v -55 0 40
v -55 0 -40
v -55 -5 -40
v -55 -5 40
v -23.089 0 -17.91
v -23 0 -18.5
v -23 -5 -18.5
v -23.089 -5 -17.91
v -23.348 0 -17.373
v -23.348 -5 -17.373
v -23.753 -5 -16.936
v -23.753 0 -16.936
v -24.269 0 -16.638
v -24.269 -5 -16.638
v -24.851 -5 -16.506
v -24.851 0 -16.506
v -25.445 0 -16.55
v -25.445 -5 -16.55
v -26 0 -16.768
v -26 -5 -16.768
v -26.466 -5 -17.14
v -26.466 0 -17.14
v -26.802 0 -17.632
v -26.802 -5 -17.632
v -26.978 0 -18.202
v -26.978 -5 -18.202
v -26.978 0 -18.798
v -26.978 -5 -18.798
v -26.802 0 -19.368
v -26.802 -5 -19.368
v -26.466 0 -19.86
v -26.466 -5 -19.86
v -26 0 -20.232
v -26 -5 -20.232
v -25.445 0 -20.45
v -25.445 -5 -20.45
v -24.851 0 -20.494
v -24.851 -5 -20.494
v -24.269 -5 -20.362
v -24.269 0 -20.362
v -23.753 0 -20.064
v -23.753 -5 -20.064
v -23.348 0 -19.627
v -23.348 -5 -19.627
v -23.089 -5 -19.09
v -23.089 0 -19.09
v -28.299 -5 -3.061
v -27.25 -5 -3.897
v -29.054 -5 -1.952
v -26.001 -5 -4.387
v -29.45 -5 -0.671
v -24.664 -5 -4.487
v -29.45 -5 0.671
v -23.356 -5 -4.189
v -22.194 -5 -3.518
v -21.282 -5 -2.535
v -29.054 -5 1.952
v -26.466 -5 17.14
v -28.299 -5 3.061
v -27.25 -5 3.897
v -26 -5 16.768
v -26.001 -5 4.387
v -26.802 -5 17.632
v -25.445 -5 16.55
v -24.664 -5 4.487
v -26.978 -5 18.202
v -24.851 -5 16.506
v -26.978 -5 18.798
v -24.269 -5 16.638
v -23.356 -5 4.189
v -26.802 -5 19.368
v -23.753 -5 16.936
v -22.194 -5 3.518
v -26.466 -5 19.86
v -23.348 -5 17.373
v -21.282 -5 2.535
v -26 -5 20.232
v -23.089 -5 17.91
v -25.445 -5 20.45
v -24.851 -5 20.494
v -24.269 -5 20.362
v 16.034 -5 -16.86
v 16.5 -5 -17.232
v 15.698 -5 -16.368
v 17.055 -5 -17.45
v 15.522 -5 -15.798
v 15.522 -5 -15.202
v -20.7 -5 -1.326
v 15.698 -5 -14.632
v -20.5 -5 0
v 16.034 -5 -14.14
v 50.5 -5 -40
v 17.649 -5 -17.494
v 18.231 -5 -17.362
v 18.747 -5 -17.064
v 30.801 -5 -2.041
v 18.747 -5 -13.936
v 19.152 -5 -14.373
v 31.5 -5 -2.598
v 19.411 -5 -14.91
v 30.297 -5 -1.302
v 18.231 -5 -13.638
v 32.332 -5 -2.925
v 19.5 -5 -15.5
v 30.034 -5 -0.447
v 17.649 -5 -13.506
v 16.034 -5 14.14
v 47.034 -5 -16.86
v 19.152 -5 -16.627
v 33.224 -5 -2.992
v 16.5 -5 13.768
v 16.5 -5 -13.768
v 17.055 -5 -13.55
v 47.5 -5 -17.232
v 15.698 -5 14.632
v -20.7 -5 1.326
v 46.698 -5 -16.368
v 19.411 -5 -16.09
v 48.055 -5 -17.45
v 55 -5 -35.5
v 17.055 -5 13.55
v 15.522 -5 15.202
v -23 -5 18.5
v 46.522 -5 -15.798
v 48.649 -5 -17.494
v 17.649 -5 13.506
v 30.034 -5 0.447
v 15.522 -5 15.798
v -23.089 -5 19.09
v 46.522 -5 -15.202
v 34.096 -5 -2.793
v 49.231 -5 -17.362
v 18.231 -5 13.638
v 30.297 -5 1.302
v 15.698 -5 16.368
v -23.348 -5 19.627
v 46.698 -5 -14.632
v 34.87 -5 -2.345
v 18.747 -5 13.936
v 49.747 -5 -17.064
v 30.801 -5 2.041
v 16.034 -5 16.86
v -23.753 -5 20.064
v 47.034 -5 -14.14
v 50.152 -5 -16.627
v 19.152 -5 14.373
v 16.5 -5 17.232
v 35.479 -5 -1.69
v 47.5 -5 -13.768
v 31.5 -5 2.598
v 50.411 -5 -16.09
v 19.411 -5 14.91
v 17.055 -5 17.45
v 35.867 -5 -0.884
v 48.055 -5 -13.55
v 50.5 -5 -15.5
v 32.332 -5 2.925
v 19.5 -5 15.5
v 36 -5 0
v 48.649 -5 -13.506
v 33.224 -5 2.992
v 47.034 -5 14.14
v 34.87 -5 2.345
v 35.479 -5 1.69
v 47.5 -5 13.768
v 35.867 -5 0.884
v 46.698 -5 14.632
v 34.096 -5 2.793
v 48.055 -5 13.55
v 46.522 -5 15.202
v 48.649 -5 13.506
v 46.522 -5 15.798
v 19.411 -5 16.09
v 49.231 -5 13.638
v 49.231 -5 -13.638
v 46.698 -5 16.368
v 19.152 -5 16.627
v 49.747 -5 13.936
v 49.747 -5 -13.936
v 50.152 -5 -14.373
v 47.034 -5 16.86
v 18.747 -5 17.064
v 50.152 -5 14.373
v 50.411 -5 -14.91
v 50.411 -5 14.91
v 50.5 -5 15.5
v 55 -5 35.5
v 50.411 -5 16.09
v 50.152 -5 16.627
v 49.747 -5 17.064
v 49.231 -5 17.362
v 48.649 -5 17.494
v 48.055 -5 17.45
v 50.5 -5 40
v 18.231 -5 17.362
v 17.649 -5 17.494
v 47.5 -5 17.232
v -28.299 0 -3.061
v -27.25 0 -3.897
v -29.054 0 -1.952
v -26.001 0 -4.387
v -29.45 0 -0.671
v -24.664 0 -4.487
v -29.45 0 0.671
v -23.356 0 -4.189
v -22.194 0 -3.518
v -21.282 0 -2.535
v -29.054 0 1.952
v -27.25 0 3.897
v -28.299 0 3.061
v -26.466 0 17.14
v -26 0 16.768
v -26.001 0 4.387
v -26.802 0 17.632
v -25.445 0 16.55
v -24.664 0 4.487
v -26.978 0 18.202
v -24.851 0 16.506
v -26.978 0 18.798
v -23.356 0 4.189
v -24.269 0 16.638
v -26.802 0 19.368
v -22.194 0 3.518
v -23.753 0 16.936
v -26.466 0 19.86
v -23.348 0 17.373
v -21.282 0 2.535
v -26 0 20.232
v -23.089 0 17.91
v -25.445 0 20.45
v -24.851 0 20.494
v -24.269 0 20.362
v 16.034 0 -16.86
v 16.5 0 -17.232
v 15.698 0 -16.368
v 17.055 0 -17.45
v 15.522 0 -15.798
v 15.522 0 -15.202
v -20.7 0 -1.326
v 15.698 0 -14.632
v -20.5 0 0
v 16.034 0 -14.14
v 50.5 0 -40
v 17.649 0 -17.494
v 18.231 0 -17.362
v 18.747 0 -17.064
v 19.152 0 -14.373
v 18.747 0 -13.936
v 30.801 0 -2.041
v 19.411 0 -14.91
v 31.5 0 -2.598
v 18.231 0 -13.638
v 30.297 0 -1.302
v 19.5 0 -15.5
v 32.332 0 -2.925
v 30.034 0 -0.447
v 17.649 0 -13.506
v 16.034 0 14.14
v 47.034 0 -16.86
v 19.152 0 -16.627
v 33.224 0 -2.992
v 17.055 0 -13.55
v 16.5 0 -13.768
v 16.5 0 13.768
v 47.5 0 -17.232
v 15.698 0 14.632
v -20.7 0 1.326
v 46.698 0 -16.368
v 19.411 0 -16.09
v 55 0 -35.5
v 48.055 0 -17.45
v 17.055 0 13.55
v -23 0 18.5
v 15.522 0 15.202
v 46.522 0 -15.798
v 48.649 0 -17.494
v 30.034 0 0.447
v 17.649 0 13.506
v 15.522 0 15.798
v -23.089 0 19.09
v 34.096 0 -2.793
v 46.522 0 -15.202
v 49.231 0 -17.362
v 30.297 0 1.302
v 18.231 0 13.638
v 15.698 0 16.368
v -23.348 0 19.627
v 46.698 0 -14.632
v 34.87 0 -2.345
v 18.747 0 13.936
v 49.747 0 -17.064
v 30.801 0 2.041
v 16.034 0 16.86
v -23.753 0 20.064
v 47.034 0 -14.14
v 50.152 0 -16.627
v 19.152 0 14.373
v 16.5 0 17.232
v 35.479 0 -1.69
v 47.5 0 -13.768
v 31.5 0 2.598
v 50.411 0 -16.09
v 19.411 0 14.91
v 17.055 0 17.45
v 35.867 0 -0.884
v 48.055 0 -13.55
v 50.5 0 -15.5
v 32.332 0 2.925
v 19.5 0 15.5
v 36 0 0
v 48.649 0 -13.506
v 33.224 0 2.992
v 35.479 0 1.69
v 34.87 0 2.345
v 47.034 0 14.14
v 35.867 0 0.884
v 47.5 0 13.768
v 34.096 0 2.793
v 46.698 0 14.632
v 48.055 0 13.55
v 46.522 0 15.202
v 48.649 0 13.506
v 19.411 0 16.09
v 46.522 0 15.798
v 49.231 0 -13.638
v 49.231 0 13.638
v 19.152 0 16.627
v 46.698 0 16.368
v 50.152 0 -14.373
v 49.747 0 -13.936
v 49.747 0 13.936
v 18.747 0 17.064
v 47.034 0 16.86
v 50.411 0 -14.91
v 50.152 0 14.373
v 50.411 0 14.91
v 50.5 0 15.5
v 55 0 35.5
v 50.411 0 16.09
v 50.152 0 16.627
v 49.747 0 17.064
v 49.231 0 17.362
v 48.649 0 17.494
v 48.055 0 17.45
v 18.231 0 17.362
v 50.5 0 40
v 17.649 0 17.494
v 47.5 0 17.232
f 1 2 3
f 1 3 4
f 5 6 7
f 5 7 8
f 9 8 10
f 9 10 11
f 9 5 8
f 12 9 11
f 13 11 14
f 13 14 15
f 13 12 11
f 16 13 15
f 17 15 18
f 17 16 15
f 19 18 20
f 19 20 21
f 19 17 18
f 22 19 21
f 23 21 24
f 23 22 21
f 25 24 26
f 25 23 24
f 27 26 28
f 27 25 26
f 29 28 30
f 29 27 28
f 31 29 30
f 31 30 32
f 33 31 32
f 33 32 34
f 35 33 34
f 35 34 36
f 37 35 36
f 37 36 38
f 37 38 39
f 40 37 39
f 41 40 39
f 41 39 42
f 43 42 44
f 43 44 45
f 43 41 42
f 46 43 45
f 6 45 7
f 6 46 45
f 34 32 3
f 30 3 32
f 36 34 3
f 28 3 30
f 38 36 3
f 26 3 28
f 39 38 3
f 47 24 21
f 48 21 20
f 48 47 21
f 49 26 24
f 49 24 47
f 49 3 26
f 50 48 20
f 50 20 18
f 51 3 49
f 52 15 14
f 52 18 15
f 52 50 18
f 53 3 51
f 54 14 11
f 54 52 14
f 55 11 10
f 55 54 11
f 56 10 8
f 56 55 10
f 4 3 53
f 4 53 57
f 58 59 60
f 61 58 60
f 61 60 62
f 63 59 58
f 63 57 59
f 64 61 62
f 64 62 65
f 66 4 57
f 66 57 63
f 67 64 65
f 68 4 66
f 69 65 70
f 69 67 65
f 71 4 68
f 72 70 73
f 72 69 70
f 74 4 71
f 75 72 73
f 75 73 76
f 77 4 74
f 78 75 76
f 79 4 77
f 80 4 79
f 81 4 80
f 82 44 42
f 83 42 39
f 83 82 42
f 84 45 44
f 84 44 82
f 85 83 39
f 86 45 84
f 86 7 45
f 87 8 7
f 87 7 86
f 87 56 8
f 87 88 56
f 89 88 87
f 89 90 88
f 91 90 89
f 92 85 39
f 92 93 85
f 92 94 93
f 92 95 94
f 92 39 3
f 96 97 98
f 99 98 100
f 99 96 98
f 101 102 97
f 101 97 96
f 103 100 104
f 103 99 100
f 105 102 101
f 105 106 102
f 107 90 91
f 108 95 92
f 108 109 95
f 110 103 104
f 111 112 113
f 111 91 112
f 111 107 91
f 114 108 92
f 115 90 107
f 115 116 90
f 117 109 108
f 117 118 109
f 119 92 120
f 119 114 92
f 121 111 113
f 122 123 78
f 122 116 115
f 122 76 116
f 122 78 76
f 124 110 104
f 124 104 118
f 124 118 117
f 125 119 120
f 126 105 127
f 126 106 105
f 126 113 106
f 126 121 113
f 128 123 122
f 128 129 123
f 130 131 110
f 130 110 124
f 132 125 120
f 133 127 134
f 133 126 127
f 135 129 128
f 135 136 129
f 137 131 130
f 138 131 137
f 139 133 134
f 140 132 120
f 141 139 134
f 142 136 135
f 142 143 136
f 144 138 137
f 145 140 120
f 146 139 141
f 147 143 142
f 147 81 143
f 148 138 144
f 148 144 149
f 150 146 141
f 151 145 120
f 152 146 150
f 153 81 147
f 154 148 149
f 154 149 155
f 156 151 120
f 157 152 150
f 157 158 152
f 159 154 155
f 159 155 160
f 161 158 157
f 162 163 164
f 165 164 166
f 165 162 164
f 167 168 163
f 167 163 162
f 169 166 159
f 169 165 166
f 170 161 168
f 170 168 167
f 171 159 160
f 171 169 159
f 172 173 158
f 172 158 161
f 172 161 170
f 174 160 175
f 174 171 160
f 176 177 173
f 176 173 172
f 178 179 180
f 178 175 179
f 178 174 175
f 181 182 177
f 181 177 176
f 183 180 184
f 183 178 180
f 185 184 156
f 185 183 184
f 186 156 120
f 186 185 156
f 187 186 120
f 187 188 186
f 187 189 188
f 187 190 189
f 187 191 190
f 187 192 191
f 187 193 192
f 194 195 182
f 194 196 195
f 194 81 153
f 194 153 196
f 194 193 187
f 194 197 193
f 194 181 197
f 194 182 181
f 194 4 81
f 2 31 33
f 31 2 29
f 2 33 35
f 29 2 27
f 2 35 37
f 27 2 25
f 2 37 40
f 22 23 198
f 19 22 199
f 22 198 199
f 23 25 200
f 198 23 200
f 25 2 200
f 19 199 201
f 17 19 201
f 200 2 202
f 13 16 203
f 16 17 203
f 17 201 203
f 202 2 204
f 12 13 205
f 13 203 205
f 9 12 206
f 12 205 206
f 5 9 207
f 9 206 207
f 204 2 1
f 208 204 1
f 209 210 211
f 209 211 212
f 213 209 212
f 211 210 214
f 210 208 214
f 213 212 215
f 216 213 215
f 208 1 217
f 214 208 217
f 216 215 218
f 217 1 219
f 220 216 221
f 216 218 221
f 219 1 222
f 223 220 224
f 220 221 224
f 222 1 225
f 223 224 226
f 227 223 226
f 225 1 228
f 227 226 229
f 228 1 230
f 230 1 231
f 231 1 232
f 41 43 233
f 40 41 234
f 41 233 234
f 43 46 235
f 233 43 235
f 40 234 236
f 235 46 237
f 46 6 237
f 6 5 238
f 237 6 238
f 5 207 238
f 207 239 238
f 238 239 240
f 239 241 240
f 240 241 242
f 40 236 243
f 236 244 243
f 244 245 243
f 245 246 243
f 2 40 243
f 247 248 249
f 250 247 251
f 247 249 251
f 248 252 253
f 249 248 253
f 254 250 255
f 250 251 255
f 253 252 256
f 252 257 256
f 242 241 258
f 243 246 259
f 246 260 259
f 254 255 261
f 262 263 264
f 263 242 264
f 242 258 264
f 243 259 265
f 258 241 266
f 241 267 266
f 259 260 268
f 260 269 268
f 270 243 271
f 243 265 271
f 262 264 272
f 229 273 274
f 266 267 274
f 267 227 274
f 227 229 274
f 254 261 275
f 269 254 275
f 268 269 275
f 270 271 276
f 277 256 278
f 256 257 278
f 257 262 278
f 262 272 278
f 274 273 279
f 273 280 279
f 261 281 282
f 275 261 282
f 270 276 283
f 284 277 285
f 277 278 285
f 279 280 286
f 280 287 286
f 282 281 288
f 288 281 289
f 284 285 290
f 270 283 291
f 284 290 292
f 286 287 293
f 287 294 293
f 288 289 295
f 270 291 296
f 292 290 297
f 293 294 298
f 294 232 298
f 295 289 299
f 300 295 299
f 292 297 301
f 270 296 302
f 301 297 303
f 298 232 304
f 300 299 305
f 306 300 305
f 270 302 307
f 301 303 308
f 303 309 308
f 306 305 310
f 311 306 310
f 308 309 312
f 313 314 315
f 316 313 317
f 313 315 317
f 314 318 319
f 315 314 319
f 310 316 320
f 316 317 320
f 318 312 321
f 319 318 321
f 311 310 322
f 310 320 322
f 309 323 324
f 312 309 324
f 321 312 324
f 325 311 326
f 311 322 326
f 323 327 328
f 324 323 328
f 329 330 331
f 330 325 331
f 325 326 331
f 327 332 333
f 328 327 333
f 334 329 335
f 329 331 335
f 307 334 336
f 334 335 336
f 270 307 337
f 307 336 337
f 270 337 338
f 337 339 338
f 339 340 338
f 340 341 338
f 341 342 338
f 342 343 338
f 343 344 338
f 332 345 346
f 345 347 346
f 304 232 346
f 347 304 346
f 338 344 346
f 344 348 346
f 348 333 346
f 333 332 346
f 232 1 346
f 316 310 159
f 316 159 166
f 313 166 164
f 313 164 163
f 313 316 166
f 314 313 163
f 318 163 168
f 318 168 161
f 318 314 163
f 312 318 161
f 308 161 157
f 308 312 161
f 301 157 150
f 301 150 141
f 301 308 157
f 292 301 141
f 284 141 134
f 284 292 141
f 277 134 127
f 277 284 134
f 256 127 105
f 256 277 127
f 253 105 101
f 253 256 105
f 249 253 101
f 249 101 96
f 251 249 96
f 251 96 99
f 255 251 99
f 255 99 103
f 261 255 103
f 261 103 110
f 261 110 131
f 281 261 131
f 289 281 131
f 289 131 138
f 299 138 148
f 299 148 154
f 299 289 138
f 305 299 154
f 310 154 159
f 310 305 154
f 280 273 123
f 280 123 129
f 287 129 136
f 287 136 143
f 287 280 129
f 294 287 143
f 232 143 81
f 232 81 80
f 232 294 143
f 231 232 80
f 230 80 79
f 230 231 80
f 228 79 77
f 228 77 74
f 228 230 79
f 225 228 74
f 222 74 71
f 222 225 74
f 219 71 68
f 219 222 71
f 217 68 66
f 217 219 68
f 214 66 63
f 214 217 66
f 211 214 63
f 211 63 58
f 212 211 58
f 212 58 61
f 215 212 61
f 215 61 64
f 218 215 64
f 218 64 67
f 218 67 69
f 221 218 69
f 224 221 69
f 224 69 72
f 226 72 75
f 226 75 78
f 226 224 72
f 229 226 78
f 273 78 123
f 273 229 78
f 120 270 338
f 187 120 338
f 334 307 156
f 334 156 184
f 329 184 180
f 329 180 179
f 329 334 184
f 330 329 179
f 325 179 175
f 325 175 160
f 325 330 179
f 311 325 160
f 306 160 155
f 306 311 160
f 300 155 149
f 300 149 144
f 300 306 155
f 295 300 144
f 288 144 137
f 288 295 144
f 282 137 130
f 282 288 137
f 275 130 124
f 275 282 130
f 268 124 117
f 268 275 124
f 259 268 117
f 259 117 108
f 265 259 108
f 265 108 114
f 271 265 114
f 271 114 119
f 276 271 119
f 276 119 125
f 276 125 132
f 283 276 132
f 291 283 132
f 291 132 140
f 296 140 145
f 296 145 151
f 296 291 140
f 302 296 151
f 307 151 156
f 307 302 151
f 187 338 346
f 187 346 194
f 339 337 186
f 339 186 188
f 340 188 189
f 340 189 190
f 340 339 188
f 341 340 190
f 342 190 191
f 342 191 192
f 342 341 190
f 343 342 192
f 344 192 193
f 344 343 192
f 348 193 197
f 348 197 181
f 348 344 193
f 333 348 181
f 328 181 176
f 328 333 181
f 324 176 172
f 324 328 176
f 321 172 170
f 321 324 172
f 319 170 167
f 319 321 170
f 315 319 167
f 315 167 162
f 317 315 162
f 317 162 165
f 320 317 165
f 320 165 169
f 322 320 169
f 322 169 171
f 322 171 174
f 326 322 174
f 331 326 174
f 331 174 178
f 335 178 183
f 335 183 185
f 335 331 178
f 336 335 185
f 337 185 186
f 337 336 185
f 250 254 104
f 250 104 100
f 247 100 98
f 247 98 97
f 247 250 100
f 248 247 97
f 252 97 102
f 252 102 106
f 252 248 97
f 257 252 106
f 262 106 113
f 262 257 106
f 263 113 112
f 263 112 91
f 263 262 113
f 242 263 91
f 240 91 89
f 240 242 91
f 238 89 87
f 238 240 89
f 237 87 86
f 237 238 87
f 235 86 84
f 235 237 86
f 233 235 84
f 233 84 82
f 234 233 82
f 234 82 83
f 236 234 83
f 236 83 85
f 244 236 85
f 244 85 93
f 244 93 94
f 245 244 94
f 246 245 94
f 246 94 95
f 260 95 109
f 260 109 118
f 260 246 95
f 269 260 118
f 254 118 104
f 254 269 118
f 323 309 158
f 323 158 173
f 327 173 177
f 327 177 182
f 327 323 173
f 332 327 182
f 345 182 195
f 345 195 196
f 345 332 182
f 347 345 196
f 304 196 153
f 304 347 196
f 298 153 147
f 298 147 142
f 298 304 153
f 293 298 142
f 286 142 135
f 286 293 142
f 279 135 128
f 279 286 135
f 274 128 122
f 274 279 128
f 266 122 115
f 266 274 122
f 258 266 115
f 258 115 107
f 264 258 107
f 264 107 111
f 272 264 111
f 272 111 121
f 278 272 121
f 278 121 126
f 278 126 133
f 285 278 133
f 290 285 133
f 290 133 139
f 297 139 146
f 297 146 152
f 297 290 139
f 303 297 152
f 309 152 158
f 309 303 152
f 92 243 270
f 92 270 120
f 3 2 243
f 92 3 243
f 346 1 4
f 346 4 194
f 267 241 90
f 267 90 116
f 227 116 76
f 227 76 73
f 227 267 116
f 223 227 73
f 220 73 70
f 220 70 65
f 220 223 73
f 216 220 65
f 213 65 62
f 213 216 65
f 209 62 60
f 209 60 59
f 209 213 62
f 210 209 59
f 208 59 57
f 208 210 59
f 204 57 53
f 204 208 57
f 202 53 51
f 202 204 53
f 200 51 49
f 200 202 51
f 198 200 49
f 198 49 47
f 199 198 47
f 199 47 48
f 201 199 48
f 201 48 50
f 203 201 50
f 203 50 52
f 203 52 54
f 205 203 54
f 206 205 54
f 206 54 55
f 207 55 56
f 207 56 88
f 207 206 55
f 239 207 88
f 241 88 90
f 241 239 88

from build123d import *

# Parameters (mm, degrees)
F0_W     = 110
F0_H     = 80
F0_R     = 2
F0_R_2   = 4.5
F0_R_3   = 3
F1_DEPTH = 5
F2_SIZE  = 4.5
F3_SIZE  = 4.5


with BuildPart() as f1:
    # F0 (on Front) → F1 (new body)
    with BuildSketch(Plane.XZ):
        Rectangle(F0_W, F0_H)
        with Locations((-25, -18.5)):
            Circle(F0_R, mode=Mode.SUBTRACT)
        with Locations((17.5, -15.5)):
            Circle(F0_R, mode=Mode.SUBTRACT)
        with Locations((48.5, -15.5)):
            Circle(F0_R, mode=Mode.SUBTRACT)
        with Locations((-25, 0)):
            Circle(F0_R_2, mode=Mode.SUBTRACT)
        with Locations((-25, 18.5)):
            Circle(F0_R, mode=Mode.SUBTRACT)
        with Locations((17.5, 15.5)):
            Circle(F0_R, mode=Mode.SUBTRACT)
        with Locations((33, 0)):
            Circle(F0_R_3, mode=Mode.SUBTRACT)
        with Locations((48.5, 15.5)):
            Circle(F0_R, mode=Mode.SUBTRACT)
    extrude(amount=F1_DEPTH)

    # F2
    f2_edges = [f1.edges().sort_by_distance(p)[0] for p in [
        (55, -2.5, 40),
    ]]
    chamfer(f2_edges, length=F2_SIZE)

    # F3
    f3_edges = [f1.edges().sort_by_distance(p)[0] for p in [
        (55, -2.5, -40),
    ]]
    chamfer(f3_edges, length=F3_SIZE)


solid = f1.part
